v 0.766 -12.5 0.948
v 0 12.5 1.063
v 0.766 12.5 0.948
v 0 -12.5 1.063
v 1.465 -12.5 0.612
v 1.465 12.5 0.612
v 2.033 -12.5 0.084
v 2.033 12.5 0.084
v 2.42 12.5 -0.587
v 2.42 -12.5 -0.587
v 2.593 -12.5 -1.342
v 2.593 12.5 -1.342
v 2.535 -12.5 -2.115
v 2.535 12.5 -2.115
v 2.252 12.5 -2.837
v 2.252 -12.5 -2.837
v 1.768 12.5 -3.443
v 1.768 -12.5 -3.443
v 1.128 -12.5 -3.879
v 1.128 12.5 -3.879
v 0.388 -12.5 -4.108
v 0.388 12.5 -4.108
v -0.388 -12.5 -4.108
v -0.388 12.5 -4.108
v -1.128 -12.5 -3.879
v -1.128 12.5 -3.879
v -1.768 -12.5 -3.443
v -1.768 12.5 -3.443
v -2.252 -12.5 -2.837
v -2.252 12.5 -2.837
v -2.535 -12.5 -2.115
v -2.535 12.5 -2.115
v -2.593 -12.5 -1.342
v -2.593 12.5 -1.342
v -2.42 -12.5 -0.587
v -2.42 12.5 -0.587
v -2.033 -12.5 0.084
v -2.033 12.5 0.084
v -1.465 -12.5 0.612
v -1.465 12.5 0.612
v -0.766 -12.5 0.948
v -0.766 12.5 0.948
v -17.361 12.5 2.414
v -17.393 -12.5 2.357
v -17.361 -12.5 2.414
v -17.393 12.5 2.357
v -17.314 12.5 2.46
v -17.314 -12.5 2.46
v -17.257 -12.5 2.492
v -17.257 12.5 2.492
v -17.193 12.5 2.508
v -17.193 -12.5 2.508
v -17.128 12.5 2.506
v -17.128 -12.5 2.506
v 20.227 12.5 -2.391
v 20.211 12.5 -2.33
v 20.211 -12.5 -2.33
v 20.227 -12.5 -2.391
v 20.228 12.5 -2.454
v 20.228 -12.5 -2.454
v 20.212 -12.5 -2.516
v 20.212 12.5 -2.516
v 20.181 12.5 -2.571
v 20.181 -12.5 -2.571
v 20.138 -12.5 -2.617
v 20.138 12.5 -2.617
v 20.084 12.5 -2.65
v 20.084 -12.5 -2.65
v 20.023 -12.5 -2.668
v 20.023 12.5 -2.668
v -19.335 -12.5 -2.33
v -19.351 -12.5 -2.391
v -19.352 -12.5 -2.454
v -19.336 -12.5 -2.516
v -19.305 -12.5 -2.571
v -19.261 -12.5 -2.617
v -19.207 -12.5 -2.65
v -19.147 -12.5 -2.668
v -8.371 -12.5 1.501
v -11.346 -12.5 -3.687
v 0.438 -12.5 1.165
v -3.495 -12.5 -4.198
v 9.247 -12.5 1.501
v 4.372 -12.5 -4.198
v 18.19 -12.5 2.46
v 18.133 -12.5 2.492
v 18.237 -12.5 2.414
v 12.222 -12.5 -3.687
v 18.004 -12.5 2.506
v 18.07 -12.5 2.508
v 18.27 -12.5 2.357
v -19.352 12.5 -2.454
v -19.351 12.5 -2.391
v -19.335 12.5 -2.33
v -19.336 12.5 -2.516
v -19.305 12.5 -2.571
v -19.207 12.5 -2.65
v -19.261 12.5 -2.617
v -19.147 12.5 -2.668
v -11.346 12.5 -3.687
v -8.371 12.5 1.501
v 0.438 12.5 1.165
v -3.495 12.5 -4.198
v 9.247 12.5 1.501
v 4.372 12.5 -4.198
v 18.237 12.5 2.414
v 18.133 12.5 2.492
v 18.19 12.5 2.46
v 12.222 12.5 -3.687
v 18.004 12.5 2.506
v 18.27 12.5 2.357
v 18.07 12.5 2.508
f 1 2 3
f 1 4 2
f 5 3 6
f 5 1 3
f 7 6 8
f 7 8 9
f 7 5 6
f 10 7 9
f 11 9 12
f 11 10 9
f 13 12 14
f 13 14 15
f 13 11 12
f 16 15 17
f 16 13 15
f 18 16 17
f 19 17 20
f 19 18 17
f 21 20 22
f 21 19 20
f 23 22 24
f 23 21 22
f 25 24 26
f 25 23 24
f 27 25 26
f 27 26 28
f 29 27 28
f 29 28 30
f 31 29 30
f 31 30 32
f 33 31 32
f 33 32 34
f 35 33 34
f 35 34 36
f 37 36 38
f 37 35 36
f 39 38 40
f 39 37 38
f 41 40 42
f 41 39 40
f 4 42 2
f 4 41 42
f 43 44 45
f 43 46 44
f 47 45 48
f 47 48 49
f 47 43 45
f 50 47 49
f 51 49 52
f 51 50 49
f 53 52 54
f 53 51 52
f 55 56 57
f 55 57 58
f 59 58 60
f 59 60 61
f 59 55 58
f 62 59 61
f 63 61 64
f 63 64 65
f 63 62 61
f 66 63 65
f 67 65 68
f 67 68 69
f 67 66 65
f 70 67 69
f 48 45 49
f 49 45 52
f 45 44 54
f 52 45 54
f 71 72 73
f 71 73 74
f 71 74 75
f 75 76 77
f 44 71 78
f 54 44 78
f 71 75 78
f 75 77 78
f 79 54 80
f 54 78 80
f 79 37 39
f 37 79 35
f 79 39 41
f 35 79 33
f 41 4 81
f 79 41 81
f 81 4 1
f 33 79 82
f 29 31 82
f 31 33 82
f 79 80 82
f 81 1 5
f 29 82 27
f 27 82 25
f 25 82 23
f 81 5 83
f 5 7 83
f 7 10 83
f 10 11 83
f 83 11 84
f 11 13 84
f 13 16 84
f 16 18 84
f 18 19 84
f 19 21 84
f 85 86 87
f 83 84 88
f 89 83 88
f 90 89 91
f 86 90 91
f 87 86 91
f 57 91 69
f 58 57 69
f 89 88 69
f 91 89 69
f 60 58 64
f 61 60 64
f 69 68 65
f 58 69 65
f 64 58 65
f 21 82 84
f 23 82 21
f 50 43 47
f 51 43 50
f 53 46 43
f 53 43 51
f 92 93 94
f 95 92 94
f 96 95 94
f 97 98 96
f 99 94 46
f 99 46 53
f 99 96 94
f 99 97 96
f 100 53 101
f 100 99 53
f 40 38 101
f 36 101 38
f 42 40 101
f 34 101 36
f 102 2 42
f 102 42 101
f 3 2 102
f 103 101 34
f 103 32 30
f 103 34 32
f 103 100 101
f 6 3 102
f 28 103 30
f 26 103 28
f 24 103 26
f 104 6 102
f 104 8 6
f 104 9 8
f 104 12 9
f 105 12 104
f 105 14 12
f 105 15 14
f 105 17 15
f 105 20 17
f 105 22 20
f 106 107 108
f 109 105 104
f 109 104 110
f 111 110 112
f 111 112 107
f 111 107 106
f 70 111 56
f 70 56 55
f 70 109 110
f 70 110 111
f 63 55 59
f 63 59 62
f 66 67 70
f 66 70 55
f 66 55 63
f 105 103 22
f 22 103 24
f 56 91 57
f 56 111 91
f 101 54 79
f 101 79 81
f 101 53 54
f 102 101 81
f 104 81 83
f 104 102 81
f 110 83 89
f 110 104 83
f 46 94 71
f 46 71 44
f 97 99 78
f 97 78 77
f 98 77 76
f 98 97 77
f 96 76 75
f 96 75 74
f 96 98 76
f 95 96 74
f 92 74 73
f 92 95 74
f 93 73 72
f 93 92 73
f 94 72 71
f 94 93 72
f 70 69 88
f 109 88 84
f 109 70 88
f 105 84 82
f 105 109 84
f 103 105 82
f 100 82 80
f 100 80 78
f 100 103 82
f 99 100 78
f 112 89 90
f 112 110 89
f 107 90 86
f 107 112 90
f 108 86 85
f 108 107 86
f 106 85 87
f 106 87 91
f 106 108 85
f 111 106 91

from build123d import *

# Parameters (mm, degrees)
SKETCH1_R           = 2.6
BOSS_EXTRUDE1_DEPTH = 12.5


with BuildPart() as part:
    # Sketch1 → Boss-Extrude1 (new, symmetric)
    with BuildSketch(Plane(origin=(0, 0, 0), x_dir=(1, 0, 0), z_dir=(0, 1, 0))):
        with BuildLine():
            Line((18.269584171, -2.356974332), (20.210940503, 2.329874452))
            ThreePointArc((20.210940503, 2.329874452), (20.19858704, 2.544220241), (20.022938795, 2.667688533))
            ThreePointArc((20.022938795, 2.667688533), (0.438109454, 4.261682942), (-19.146719886, 2.667688533))
            ThreePointArc((-19.146719886, 2.667688533), (-19.322368131, 2.544220241), (-19.334721594, 2.329874452))
            Line((-19.334721594, 2.329874452), (-17.393365262, -2.356974332))
            ThreePointArc((-17.393365262, -2.356974332), (-17.286501727, -2.477513642), (-17.128021481, -2.506384946))
            ThreePointArc((-17.128021481, -2.506384946), (0.438109454, -1.164961325), (18.00424039, -2.506384946))
            ThreePointArc((18.00424039, -2.506384946), (18.162720636, -2.477513642), (18.269584171, -2.356974332))
        make_face()
        with Locations(Location((0, 1.536674283, 0), (0, 0, 270))):
            Circle(SKETCH1_R, mode=Mode.SUBTRACT)
    extrude(amount=BOSS_EXTRUDE1_DEPTH, both=True)


solid = part.part
